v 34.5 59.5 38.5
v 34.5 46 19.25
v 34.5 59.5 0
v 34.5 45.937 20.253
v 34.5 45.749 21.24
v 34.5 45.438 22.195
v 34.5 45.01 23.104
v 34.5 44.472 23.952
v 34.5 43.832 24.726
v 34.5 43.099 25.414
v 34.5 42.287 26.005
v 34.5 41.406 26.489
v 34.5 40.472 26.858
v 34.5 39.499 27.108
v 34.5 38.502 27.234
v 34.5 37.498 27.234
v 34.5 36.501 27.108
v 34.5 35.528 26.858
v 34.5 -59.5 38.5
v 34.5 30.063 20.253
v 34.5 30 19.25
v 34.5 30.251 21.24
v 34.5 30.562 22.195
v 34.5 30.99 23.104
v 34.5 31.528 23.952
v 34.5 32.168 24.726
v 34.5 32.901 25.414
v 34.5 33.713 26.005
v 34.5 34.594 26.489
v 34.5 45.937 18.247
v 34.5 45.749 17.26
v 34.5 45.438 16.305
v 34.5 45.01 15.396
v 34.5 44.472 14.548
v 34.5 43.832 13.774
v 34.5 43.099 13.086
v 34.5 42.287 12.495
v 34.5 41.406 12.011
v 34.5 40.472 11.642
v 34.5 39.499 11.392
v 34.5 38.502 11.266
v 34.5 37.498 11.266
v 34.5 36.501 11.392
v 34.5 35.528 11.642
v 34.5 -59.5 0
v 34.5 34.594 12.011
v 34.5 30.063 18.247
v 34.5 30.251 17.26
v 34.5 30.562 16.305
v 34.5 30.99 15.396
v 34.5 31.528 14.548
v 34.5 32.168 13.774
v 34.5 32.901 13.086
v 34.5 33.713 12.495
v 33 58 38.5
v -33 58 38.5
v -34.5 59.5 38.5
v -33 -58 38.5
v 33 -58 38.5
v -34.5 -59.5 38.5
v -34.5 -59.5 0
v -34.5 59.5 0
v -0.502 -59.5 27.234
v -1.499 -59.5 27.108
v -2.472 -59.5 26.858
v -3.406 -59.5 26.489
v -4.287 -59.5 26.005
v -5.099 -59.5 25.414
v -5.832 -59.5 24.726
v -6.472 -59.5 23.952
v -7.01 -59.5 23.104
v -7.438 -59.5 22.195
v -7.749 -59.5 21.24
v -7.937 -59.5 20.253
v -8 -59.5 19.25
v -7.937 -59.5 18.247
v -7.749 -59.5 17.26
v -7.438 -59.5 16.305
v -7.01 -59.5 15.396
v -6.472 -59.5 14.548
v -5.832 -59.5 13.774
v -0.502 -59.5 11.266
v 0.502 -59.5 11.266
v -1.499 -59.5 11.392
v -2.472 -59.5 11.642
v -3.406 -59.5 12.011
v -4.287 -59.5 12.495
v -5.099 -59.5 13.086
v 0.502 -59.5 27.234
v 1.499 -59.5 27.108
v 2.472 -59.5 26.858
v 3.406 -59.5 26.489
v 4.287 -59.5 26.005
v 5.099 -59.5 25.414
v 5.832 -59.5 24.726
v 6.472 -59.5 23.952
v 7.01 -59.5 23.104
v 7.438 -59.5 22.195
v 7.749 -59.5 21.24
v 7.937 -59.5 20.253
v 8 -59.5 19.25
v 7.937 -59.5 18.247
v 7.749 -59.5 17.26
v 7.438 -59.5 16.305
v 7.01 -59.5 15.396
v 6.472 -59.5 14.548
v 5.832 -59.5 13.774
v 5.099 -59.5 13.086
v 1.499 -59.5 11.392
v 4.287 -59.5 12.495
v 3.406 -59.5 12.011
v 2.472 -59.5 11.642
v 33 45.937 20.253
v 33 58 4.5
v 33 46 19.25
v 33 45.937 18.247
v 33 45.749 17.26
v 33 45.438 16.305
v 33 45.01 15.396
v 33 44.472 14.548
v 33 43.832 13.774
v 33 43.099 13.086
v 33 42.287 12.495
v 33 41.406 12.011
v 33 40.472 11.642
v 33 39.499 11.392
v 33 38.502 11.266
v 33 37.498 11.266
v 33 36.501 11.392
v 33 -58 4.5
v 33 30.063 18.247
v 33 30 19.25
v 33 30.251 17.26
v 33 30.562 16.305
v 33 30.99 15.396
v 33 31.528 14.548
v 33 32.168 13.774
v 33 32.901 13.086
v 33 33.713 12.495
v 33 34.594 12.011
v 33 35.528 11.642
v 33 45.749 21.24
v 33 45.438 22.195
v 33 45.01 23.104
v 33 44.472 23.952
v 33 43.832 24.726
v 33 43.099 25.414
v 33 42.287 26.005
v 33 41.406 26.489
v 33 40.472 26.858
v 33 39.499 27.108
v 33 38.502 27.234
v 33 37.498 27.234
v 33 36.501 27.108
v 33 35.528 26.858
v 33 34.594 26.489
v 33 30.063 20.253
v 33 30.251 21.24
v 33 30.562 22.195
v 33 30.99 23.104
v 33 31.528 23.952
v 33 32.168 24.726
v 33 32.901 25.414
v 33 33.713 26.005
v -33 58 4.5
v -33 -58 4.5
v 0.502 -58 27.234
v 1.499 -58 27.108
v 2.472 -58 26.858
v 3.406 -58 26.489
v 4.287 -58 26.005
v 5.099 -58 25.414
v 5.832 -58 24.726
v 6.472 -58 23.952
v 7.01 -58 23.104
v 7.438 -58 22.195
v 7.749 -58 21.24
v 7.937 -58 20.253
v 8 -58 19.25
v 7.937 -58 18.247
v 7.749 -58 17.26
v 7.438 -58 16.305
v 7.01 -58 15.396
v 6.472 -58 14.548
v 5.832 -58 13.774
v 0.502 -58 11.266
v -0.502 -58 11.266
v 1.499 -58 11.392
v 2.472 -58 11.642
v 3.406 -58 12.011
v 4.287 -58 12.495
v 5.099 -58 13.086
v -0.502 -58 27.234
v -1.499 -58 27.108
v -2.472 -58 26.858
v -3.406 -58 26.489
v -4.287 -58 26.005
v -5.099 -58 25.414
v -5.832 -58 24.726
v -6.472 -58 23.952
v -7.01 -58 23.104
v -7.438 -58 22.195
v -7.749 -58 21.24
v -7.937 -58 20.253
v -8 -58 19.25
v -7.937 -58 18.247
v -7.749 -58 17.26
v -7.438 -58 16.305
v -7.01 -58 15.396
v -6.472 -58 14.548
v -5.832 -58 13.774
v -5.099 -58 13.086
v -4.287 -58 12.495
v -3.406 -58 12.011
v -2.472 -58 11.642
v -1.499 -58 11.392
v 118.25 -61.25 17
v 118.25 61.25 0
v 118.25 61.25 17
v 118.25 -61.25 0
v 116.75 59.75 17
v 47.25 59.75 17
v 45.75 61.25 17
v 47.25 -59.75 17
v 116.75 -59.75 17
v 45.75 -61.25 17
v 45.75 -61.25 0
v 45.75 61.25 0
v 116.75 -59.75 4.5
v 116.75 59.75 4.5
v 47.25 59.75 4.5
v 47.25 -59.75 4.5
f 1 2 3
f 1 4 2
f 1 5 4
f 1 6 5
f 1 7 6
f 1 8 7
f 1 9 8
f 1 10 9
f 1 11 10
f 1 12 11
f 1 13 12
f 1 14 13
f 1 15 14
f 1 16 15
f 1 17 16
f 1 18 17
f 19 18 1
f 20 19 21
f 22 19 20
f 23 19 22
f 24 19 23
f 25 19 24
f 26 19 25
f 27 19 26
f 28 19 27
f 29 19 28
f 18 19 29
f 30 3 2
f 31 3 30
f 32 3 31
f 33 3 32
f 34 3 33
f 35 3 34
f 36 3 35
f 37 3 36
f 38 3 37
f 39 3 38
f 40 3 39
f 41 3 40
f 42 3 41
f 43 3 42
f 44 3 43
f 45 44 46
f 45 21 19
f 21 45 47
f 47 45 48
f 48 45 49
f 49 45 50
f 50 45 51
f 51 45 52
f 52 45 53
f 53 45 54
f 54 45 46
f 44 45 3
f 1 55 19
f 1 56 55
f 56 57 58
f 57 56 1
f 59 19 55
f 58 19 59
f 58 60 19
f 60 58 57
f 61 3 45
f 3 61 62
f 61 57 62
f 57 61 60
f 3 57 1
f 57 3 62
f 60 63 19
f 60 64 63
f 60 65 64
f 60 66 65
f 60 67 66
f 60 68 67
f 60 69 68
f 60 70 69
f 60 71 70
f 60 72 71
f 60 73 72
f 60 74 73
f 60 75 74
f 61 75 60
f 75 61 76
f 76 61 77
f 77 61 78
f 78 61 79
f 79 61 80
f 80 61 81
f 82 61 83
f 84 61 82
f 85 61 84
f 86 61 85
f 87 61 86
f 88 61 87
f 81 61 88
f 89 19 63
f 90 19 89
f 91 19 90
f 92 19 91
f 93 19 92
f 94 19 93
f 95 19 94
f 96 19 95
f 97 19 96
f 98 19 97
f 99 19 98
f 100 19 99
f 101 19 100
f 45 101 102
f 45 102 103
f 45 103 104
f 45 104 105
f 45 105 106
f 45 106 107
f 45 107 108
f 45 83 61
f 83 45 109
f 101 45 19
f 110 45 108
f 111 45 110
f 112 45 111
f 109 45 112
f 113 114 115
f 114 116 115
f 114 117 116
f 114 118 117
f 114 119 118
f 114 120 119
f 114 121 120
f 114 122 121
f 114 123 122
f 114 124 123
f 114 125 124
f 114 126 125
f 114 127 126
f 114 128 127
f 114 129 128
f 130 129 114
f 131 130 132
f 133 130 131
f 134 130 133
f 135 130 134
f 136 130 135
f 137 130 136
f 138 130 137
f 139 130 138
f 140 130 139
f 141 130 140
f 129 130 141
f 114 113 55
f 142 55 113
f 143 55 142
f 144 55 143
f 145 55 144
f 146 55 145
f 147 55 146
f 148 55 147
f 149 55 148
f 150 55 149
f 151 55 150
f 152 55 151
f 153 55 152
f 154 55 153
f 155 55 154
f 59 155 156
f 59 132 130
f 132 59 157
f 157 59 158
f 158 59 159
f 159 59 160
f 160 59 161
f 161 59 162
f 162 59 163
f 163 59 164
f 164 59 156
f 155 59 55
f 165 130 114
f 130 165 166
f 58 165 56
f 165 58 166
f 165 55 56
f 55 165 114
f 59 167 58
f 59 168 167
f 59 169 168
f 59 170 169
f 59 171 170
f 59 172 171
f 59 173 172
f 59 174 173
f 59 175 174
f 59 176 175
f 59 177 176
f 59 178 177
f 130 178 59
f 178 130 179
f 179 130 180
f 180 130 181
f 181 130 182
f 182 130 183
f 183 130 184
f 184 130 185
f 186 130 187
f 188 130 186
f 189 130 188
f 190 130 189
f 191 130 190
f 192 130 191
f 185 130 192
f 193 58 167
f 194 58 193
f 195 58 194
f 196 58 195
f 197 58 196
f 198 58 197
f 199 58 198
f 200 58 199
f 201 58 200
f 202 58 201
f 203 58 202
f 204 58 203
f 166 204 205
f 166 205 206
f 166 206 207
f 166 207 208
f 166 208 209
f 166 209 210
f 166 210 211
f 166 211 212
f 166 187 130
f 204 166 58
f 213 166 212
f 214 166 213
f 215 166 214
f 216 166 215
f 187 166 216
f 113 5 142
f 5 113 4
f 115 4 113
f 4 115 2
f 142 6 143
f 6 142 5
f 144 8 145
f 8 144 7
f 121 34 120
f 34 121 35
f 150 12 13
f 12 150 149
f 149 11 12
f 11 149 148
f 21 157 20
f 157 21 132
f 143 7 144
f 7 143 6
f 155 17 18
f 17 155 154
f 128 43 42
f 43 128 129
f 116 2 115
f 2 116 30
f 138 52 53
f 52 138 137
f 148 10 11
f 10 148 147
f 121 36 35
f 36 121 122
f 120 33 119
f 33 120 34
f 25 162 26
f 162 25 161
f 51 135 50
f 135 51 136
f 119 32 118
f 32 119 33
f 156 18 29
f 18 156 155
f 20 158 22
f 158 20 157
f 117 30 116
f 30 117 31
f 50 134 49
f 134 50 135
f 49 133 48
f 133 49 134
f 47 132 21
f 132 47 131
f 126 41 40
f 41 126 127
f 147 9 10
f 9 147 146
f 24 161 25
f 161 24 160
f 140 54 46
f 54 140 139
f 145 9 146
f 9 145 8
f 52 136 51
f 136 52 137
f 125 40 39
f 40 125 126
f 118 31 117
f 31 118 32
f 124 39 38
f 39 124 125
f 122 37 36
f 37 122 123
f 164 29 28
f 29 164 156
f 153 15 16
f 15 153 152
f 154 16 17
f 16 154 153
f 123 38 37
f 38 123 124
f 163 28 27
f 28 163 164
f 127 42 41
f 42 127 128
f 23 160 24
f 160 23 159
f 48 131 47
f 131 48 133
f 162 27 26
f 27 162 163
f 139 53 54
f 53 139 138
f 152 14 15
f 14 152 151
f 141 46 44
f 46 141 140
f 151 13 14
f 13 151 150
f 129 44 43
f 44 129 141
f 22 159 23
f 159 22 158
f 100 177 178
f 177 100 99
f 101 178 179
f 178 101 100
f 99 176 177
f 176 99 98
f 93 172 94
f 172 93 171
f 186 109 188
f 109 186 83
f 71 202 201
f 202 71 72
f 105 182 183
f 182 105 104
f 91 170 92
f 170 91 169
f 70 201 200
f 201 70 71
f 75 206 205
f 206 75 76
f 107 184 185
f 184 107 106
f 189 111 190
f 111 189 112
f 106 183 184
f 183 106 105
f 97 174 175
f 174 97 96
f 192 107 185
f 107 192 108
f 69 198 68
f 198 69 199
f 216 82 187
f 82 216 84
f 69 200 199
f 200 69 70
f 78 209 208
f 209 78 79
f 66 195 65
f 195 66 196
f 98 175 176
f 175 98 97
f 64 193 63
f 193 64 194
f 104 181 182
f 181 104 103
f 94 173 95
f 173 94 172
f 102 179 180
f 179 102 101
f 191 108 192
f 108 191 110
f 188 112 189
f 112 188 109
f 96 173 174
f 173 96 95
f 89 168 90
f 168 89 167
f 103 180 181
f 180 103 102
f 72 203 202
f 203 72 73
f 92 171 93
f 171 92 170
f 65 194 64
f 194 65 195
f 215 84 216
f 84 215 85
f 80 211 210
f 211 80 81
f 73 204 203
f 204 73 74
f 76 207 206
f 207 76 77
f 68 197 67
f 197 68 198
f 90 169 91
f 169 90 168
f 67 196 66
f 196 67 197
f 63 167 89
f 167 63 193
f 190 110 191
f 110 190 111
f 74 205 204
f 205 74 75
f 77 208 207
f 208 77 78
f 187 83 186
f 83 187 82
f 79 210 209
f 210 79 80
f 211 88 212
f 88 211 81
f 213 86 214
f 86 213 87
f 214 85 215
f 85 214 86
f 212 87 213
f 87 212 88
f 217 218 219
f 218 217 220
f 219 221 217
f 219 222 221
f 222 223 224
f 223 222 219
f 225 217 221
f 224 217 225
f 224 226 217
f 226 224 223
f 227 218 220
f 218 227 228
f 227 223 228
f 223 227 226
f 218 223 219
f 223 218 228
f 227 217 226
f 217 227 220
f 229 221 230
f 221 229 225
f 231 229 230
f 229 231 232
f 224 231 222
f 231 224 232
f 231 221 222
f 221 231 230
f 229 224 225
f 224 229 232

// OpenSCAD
/*
*  Filename:    DC2416-Box.scad
*  Created by: Anhtien Nguyen
*  Date:  Aug 24, 2018
   Description: Design the box and cover for electronic board
 *  120/220 VAC to 24VDC power supply, model DC2416
*/


// Choose, which part you want to see!
part = "all_parts__";  //[all_parts__:All Parts,bottom_part__:Bottom,top_part__:Top]


// Dimensions for DC2416 is 65.5 x 115.5 x 35
width=65.5;//[29:87]
length = 115.5;//[53:160]
height=35; //[13:40]
lid_height = 10;//[5:15]

// Adjust for clearance, thickness, and wire holes
gap = 0.5;
thickness = 3;
hole_radius = 8;

// Program Section //
if(part == "bottom_part__") {
    box();
} else if(part == "top_part__") {
    box(width = width + gap*2 + thickness, length = length + gap*2+ thickness, height = lid_height + gap*2+ thickness,lid=true);
} else if(part == "all_parts__") {
    all_parts();
} else {
    all_parts();
}

module all_parts() {
// call the function for the bottom part
//
translate([0,0,(height+gap+thickness)/2]) box();
//
// call the function for the top part
//
translate([width+gap+(thickness*2)+10,0,(lid_height+gap*2+thickness*2)/2]) box(width = width + gap*2+ thickness, length = length + gap*2+ thickness, height = lid_height + gap*2+ thickness ,lid=true);
}
// special variable
dy = 20; // offset of the side hole
/*
 * Function box()
 * Draw the box without the top
 */
module box(width = width+gap, length = length+gap , height = height +gap, lid=false) {
    ow_width = width + thickness;
    ow_length= length + thickness;
    ow_height= height  + thickness;

//    rotate([0,0,45]) translate([-ow_width/2,-ow_length/2,0]) cube([10,10,ow_height+thickness*2],center=true);
    difference() {
        // define the box without the top
        union() 
        difference() {
                // outside wall
                intersection() {
                    cube([ow_width, ow_length, ow_height],center=true);
                }
                // inside wall
                 translate([0,0,thickness]) intersection() {
                   cube([width, length, height],center=true);
                 }
        } 
        
        // if it's the bottom part, punch two holes for the wires
        if(!lid) {
            rotate([90,0,90]) translate([length/2-dy,0,width/2]) cylinder(r=hole_radius,h=thickness*2,$fn=50,center=true);
            rotate([90,0,0]) translate([0,0, length/2]) cylinder(r=hole_radius,h=thickness*2,$fn=50,center=true);
        }
    }
}
